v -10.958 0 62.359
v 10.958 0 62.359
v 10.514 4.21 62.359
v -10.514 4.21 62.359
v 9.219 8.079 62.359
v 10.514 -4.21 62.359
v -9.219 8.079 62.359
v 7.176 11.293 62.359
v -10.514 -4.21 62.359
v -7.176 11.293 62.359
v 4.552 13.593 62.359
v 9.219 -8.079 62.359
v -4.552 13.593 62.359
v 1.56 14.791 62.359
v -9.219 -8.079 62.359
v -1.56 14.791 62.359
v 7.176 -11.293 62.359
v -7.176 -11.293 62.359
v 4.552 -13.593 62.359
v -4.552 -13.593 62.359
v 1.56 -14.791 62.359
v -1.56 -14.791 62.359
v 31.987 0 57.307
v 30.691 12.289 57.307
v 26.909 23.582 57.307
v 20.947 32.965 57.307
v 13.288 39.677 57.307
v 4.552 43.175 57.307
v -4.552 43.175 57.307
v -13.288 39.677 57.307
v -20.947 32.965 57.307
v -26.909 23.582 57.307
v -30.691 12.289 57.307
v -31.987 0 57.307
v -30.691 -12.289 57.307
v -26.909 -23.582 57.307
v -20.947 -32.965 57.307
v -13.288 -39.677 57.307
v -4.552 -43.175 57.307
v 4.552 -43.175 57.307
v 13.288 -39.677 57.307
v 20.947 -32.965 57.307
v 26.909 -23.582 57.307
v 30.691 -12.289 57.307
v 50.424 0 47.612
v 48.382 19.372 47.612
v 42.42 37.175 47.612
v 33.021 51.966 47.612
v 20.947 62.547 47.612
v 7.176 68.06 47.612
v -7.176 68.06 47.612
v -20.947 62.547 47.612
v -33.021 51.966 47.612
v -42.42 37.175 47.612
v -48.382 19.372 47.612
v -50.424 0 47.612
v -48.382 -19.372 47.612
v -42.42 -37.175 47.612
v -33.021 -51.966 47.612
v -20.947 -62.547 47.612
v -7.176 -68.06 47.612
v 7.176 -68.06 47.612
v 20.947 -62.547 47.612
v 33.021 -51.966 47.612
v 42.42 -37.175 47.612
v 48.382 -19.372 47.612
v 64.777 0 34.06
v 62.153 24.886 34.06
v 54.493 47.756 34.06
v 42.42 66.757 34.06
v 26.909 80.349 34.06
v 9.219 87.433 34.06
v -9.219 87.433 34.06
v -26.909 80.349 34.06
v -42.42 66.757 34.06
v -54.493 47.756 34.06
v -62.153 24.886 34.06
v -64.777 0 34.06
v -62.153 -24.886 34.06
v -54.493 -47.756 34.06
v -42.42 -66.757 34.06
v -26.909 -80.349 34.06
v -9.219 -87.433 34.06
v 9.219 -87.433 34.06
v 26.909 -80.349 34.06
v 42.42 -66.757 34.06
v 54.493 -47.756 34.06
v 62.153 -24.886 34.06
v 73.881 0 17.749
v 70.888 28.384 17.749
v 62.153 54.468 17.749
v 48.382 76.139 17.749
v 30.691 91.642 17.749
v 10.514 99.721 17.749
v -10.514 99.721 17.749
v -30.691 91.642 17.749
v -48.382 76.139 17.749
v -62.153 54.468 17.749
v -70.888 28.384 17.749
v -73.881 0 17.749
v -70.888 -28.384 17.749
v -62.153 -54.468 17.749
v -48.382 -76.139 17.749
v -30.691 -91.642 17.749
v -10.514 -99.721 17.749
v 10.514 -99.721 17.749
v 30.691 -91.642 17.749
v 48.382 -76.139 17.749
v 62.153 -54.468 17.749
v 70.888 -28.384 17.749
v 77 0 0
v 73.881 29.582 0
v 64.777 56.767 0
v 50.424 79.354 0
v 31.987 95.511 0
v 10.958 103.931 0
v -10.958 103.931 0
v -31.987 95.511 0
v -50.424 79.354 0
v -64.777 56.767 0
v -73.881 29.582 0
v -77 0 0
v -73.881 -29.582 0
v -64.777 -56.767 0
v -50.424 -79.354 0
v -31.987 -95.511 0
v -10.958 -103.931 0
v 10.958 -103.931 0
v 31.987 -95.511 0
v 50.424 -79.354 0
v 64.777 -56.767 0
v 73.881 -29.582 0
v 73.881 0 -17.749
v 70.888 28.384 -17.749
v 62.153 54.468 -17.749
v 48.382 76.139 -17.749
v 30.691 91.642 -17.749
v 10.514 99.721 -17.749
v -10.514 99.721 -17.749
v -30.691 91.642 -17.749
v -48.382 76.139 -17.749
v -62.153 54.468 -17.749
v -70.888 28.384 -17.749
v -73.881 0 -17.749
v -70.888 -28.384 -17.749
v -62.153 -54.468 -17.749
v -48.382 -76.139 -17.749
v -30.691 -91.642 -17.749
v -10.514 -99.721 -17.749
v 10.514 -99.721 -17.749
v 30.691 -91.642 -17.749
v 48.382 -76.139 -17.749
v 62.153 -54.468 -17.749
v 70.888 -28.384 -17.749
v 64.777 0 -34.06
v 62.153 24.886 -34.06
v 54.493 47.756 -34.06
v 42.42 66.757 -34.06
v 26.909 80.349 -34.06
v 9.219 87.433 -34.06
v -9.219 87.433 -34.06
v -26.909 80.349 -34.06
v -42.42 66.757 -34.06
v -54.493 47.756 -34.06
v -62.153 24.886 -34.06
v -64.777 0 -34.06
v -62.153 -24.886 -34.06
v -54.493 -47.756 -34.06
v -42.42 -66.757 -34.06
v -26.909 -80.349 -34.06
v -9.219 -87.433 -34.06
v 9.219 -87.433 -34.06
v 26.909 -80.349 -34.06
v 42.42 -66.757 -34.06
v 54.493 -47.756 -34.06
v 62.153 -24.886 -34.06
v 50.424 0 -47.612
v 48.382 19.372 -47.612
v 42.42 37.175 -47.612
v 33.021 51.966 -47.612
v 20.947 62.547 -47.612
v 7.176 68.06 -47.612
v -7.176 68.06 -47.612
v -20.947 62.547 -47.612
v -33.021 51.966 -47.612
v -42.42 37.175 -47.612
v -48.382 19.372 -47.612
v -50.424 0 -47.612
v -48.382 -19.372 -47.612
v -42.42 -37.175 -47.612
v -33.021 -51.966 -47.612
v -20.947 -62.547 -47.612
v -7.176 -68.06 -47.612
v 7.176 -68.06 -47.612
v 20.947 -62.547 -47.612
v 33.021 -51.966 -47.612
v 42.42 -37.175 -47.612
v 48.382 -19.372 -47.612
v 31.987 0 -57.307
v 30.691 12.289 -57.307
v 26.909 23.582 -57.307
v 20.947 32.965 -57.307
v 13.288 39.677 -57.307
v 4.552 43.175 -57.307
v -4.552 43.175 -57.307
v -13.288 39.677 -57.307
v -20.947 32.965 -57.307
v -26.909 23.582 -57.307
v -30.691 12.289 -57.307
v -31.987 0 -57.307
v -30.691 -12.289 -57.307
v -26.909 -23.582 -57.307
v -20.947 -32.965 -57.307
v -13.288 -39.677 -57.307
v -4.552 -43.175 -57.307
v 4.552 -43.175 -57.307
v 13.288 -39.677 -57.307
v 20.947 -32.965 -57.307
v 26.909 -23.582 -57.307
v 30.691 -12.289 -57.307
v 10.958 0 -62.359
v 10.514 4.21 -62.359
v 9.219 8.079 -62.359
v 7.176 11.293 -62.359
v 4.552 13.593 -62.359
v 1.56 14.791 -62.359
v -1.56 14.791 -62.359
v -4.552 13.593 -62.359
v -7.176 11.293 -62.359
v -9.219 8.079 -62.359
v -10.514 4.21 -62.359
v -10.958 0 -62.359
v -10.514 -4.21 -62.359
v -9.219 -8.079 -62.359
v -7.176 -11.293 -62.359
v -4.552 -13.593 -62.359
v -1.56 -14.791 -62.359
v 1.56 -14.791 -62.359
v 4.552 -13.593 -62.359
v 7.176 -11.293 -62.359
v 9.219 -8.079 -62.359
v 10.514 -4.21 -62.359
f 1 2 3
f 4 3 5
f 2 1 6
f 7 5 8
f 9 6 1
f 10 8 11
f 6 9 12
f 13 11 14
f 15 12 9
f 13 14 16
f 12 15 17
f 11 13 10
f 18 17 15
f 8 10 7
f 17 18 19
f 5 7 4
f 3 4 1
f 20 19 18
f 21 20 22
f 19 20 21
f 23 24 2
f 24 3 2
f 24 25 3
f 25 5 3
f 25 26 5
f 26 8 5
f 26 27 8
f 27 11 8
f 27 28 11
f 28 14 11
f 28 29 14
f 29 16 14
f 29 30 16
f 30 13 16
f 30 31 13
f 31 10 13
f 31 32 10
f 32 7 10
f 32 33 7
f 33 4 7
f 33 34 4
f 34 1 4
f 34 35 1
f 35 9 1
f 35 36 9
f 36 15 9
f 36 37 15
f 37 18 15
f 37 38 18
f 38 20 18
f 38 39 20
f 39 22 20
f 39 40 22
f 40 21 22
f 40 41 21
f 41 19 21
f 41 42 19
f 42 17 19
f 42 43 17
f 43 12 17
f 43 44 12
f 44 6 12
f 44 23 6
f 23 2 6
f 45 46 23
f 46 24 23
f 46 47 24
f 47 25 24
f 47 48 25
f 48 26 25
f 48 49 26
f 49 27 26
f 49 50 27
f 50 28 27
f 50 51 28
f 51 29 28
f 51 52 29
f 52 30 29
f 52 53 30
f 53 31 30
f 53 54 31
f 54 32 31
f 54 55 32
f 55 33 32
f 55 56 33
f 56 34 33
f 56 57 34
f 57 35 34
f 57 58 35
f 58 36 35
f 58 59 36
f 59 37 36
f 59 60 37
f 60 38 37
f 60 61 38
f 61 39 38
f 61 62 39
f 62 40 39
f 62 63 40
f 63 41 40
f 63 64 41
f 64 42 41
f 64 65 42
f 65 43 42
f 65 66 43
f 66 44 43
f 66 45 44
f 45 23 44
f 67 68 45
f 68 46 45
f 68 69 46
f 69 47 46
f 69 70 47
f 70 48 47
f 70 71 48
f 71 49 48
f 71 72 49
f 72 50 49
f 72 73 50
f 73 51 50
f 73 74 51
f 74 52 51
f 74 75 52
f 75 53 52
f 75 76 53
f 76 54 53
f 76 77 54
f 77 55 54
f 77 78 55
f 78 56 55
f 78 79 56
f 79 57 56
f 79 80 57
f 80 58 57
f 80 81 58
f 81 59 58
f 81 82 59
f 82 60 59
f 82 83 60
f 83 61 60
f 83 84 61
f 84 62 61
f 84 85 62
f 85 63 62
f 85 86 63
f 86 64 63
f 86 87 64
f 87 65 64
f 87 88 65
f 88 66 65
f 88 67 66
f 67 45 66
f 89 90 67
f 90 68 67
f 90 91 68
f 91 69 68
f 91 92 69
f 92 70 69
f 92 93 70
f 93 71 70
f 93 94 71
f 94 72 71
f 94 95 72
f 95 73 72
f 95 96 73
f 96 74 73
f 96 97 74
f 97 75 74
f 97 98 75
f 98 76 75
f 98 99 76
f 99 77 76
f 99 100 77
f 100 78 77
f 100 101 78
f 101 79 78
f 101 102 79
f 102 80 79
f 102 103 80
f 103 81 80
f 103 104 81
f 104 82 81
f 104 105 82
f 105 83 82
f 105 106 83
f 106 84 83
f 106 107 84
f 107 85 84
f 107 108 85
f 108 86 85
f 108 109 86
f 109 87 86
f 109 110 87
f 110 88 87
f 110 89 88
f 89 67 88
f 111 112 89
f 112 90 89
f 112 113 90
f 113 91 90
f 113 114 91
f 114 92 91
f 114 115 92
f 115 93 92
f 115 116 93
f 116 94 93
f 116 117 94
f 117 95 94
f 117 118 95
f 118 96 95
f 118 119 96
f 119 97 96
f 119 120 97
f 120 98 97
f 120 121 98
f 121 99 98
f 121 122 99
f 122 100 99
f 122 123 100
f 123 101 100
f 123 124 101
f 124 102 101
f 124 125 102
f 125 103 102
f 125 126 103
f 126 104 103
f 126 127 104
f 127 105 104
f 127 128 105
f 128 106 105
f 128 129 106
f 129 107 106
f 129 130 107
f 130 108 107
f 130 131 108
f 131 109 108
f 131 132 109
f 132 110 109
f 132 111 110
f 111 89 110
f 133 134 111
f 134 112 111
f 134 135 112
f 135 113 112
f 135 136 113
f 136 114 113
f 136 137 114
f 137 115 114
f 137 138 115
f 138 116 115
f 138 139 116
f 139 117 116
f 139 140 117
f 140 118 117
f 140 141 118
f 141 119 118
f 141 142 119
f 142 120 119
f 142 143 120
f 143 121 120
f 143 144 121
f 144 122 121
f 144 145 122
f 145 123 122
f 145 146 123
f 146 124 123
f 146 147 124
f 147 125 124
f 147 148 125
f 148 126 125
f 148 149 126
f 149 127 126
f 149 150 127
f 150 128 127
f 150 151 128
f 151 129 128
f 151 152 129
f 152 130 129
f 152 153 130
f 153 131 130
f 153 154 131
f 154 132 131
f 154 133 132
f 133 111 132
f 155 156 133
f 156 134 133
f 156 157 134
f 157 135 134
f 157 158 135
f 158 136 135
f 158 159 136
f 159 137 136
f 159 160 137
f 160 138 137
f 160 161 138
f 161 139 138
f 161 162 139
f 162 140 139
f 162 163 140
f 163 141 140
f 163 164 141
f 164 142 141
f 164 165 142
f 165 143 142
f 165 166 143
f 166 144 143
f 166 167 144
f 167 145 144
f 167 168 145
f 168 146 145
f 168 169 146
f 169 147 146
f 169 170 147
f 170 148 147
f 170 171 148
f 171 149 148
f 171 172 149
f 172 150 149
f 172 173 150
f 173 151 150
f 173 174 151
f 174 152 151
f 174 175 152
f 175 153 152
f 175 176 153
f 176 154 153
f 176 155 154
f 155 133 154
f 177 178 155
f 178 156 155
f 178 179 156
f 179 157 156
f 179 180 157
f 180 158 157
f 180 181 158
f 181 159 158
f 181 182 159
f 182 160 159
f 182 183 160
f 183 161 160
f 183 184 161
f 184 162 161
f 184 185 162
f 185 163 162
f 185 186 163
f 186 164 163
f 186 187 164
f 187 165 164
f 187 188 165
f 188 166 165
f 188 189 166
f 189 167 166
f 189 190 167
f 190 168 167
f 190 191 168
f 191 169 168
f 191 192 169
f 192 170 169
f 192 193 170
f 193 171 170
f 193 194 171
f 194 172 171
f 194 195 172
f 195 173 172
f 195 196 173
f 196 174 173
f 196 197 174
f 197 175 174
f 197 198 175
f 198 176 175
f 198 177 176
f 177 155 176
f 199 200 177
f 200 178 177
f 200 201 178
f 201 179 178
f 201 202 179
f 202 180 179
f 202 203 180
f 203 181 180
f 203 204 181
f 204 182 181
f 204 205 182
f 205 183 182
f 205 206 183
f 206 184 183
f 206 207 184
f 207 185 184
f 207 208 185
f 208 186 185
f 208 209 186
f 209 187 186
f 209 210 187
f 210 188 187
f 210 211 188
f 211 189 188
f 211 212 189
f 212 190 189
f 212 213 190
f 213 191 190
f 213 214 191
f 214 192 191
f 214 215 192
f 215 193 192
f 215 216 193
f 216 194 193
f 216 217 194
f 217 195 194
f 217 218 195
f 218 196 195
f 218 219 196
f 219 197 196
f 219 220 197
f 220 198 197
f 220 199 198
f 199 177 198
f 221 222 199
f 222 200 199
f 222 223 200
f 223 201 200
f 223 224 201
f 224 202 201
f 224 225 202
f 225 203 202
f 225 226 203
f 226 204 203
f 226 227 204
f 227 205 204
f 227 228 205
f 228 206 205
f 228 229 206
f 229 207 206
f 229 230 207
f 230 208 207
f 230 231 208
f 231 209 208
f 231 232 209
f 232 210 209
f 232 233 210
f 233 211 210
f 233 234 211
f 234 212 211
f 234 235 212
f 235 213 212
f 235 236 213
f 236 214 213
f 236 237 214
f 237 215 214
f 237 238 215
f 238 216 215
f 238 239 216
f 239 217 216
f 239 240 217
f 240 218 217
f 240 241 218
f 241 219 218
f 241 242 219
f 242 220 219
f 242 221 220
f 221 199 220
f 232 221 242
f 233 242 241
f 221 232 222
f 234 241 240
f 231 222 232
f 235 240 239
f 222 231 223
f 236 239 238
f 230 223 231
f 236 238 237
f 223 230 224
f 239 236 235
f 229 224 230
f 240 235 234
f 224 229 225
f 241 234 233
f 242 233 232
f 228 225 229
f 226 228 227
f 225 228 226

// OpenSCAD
// Generated by SolidPython 1.0.1 on 2020-07-29 00:46:50


scale(v = [11, 15, 9]) {
	sphere(r = 7);
}
/***********************************************
*********      SolidPython code:      **********
************************************************
 
# import packages: SolidPython
from solid import *
from solid.utils import *
from itertools import chain, combinations, permutations


class Resize:

    def __init__(self, scad_file):
        self.scad_file = scad_file
        #self.scad_file = import_scad(scad_file)
        # cone/cylinder param:
        self.r1 = 0
        self.r2 = 0
        self.h = 0
        # rectangular prism param:
        self.w = 0
        self.l = 0
        # ellipse param:
        self.r = 0

    # import OpenScad code (file name corresponds to shape)


    # classify shape + parameters
    def assign(self, param1, param2, param3):
        if self.scad_file == 'cone.scad':
            self.r1 = param1
            self.r2 = param2
            self.h = param3
        elif self.scad_file == 'cylinder.scad':
            self.r1 = param1
            self.r2 = param2
            self.h = param3
        elif self.scad_file == 'rectangularPrism.scad':
            self.h = param1
            self.l = param2
            self.w = param3
        else:
            self.r = param1
            self.h = param2

    # resize parameters
    def iterate(self):
        x = range(3, 20, 2)
        i = 1
        if self.scad_file == 'cone.scad':
            tempList = list(permutations(x, 2))
            for temp in tempList:
                param1 = temp[0]
                param2 = temp[1]
                filepath = 'produced_scad_files/' + 'cone' + str(param1) + '_' + str(param2) + '_' + '.scad'
                scad_render_to_file(cylinder(h=param1, r1=param2, r2=0), filepath)

        elif self.scad_file == 'cylinder.scad':
            tempList = list(permutations(x, 3))
            for temp in tempList:
                param1 = temp[0]
                param2 = temp[1]
                filepath = 'produced_scad_files/' + 'cylinder' + str(param1) + '_' + str(param2) + '_' + '.scad'
                scad_render_to_file(cylinder(h=param1, r1=param2, r2=param2), filepath)

        elif self.scad_file == 'rectangularPrism.scad':
            tempList = list(permutations(x, 3))
            for temp in tempList:
                param1 = temp[0]
                param2 = temp[1]
                param3 = temp[2]
                filepath = 'produced_scad_files/' + 'rectangularPrism' + str(param1) + '_' + str(param2) + '_' + str(
                    param3) + '.scad'
                scad_render_to_file(cube(size=(param1, param2, param3)), filepath)

        elif self.scad_file == 'ellipse.scad':
            tempList = list(permutations(x, 4))
            for temp in tempList:
                param1 = temp[0]
                param2 = temp[1]
                param3 = temp[2]
                param4 = temp[3]
                filepath = 'produced_scad_files/' + 'ellipse' + str(param1) + '_' + str(param2) + '_' + str(param3) + '_' + str(param4) + '.scad'
                scad_render_to_file(scale([param1, param2, param3])(sphere(r=param4)), filepath)

    def render_to_scadfile(self):
        scad_render_to_file(scad, 'example.scad') 
 
************************************************/
